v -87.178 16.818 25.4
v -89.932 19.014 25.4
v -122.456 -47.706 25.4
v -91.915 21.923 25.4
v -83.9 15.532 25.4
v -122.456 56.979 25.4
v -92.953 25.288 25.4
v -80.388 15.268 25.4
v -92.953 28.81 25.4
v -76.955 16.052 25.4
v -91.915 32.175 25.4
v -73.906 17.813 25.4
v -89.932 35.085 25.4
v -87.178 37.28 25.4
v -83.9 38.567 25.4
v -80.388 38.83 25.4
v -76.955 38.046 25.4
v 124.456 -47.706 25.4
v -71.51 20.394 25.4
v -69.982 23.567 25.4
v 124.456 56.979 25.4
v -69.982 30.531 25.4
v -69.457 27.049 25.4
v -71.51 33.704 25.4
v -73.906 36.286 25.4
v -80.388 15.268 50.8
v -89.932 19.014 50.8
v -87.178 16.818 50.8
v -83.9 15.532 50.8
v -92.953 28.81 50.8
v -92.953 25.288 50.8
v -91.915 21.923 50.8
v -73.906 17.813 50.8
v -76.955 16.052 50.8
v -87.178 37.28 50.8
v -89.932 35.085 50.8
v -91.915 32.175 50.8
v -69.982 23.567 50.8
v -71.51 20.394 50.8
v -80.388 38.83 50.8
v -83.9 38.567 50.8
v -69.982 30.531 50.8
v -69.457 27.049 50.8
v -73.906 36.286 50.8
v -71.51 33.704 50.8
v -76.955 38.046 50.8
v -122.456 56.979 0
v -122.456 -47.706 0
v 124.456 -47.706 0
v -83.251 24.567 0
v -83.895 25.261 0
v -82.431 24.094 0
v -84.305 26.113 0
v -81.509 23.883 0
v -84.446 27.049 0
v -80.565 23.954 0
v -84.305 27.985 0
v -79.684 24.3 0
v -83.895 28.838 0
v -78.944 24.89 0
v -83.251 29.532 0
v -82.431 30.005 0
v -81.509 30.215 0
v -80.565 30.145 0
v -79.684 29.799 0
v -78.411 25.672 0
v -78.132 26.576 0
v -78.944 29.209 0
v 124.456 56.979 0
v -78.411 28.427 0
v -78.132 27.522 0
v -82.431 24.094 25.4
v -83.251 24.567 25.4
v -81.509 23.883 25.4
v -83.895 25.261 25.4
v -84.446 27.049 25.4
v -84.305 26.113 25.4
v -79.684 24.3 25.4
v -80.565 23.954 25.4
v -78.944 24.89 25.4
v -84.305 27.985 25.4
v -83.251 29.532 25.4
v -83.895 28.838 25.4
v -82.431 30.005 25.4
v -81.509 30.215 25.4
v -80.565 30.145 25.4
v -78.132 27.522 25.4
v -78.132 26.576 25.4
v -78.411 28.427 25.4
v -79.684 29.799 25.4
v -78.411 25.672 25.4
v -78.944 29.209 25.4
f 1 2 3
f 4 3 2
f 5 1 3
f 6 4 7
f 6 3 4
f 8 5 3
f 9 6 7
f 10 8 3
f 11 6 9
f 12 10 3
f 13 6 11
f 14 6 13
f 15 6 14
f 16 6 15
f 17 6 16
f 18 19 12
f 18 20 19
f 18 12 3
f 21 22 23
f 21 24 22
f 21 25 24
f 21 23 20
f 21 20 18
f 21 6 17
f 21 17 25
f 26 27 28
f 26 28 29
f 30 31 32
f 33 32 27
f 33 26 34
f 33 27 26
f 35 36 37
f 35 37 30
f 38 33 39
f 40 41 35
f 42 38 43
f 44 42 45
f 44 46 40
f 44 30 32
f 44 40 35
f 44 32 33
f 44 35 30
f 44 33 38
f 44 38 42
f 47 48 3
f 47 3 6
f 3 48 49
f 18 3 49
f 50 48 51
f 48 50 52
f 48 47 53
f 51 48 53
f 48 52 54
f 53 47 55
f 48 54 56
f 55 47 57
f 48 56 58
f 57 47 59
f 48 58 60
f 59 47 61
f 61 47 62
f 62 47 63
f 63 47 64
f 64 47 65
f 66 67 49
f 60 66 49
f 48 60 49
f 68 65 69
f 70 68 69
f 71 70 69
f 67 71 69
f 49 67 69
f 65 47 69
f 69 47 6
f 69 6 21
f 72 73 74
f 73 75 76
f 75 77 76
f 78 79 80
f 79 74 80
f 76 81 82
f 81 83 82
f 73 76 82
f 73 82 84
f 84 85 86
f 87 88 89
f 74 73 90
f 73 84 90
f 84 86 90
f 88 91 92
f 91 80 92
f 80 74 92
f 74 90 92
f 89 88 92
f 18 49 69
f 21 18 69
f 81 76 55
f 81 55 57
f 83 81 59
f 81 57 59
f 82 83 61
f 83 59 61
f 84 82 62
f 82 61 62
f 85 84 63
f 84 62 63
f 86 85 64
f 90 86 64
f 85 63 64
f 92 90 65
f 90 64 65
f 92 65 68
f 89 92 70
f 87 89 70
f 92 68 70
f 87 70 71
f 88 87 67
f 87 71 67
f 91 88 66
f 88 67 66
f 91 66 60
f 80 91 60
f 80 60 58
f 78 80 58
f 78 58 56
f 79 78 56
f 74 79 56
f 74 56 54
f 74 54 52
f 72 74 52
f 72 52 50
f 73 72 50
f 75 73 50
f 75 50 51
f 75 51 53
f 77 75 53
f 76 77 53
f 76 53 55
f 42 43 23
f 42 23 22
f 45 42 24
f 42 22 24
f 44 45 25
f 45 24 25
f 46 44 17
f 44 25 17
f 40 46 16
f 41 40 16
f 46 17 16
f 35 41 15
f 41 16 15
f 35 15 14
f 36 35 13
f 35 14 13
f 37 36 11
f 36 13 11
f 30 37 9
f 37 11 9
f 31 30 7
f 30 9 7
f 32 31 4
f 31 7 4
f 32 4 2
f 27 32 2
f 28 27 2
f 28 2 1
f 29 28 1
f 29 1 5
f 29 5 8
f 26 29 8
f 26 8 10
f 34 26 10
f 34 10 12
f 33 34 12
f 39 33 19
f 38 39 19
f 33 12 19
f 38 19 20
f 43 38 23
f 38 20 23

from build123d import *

# Parameters (mm, degrees)
F0_W     = 246.912122
F0_H     = 104.684964
F1_DEPTH = 25.4
F3_D     = 6.35
F2_R     = 11.813862
F4_DEPTH = 25.4


with BuildPart() as f1:
    # F0 (on Top) → F1 (new body)
    with BuildSketch(Plane.XY):
        with Locations((0.999786, 4.636642)):
            Rectangle(F0_W, F0_H)
    extrude(amount=F1_DEPTH)

    # F3 (through all)
    with Locations(Plane.XY.offset(25.4)):
        with Locations((-81.271335, 27.049223)):
            Hole(F3_D / 2)

    # F2 (on face) → F4 (join)
    with BuildSketch(Plane.XY.offset(25.4)):
        with Locations((-81.271335, 27.049223)):
            Circle(F2_R)
    extrude(amount=F4_DEPTH)


solid = f1.part
